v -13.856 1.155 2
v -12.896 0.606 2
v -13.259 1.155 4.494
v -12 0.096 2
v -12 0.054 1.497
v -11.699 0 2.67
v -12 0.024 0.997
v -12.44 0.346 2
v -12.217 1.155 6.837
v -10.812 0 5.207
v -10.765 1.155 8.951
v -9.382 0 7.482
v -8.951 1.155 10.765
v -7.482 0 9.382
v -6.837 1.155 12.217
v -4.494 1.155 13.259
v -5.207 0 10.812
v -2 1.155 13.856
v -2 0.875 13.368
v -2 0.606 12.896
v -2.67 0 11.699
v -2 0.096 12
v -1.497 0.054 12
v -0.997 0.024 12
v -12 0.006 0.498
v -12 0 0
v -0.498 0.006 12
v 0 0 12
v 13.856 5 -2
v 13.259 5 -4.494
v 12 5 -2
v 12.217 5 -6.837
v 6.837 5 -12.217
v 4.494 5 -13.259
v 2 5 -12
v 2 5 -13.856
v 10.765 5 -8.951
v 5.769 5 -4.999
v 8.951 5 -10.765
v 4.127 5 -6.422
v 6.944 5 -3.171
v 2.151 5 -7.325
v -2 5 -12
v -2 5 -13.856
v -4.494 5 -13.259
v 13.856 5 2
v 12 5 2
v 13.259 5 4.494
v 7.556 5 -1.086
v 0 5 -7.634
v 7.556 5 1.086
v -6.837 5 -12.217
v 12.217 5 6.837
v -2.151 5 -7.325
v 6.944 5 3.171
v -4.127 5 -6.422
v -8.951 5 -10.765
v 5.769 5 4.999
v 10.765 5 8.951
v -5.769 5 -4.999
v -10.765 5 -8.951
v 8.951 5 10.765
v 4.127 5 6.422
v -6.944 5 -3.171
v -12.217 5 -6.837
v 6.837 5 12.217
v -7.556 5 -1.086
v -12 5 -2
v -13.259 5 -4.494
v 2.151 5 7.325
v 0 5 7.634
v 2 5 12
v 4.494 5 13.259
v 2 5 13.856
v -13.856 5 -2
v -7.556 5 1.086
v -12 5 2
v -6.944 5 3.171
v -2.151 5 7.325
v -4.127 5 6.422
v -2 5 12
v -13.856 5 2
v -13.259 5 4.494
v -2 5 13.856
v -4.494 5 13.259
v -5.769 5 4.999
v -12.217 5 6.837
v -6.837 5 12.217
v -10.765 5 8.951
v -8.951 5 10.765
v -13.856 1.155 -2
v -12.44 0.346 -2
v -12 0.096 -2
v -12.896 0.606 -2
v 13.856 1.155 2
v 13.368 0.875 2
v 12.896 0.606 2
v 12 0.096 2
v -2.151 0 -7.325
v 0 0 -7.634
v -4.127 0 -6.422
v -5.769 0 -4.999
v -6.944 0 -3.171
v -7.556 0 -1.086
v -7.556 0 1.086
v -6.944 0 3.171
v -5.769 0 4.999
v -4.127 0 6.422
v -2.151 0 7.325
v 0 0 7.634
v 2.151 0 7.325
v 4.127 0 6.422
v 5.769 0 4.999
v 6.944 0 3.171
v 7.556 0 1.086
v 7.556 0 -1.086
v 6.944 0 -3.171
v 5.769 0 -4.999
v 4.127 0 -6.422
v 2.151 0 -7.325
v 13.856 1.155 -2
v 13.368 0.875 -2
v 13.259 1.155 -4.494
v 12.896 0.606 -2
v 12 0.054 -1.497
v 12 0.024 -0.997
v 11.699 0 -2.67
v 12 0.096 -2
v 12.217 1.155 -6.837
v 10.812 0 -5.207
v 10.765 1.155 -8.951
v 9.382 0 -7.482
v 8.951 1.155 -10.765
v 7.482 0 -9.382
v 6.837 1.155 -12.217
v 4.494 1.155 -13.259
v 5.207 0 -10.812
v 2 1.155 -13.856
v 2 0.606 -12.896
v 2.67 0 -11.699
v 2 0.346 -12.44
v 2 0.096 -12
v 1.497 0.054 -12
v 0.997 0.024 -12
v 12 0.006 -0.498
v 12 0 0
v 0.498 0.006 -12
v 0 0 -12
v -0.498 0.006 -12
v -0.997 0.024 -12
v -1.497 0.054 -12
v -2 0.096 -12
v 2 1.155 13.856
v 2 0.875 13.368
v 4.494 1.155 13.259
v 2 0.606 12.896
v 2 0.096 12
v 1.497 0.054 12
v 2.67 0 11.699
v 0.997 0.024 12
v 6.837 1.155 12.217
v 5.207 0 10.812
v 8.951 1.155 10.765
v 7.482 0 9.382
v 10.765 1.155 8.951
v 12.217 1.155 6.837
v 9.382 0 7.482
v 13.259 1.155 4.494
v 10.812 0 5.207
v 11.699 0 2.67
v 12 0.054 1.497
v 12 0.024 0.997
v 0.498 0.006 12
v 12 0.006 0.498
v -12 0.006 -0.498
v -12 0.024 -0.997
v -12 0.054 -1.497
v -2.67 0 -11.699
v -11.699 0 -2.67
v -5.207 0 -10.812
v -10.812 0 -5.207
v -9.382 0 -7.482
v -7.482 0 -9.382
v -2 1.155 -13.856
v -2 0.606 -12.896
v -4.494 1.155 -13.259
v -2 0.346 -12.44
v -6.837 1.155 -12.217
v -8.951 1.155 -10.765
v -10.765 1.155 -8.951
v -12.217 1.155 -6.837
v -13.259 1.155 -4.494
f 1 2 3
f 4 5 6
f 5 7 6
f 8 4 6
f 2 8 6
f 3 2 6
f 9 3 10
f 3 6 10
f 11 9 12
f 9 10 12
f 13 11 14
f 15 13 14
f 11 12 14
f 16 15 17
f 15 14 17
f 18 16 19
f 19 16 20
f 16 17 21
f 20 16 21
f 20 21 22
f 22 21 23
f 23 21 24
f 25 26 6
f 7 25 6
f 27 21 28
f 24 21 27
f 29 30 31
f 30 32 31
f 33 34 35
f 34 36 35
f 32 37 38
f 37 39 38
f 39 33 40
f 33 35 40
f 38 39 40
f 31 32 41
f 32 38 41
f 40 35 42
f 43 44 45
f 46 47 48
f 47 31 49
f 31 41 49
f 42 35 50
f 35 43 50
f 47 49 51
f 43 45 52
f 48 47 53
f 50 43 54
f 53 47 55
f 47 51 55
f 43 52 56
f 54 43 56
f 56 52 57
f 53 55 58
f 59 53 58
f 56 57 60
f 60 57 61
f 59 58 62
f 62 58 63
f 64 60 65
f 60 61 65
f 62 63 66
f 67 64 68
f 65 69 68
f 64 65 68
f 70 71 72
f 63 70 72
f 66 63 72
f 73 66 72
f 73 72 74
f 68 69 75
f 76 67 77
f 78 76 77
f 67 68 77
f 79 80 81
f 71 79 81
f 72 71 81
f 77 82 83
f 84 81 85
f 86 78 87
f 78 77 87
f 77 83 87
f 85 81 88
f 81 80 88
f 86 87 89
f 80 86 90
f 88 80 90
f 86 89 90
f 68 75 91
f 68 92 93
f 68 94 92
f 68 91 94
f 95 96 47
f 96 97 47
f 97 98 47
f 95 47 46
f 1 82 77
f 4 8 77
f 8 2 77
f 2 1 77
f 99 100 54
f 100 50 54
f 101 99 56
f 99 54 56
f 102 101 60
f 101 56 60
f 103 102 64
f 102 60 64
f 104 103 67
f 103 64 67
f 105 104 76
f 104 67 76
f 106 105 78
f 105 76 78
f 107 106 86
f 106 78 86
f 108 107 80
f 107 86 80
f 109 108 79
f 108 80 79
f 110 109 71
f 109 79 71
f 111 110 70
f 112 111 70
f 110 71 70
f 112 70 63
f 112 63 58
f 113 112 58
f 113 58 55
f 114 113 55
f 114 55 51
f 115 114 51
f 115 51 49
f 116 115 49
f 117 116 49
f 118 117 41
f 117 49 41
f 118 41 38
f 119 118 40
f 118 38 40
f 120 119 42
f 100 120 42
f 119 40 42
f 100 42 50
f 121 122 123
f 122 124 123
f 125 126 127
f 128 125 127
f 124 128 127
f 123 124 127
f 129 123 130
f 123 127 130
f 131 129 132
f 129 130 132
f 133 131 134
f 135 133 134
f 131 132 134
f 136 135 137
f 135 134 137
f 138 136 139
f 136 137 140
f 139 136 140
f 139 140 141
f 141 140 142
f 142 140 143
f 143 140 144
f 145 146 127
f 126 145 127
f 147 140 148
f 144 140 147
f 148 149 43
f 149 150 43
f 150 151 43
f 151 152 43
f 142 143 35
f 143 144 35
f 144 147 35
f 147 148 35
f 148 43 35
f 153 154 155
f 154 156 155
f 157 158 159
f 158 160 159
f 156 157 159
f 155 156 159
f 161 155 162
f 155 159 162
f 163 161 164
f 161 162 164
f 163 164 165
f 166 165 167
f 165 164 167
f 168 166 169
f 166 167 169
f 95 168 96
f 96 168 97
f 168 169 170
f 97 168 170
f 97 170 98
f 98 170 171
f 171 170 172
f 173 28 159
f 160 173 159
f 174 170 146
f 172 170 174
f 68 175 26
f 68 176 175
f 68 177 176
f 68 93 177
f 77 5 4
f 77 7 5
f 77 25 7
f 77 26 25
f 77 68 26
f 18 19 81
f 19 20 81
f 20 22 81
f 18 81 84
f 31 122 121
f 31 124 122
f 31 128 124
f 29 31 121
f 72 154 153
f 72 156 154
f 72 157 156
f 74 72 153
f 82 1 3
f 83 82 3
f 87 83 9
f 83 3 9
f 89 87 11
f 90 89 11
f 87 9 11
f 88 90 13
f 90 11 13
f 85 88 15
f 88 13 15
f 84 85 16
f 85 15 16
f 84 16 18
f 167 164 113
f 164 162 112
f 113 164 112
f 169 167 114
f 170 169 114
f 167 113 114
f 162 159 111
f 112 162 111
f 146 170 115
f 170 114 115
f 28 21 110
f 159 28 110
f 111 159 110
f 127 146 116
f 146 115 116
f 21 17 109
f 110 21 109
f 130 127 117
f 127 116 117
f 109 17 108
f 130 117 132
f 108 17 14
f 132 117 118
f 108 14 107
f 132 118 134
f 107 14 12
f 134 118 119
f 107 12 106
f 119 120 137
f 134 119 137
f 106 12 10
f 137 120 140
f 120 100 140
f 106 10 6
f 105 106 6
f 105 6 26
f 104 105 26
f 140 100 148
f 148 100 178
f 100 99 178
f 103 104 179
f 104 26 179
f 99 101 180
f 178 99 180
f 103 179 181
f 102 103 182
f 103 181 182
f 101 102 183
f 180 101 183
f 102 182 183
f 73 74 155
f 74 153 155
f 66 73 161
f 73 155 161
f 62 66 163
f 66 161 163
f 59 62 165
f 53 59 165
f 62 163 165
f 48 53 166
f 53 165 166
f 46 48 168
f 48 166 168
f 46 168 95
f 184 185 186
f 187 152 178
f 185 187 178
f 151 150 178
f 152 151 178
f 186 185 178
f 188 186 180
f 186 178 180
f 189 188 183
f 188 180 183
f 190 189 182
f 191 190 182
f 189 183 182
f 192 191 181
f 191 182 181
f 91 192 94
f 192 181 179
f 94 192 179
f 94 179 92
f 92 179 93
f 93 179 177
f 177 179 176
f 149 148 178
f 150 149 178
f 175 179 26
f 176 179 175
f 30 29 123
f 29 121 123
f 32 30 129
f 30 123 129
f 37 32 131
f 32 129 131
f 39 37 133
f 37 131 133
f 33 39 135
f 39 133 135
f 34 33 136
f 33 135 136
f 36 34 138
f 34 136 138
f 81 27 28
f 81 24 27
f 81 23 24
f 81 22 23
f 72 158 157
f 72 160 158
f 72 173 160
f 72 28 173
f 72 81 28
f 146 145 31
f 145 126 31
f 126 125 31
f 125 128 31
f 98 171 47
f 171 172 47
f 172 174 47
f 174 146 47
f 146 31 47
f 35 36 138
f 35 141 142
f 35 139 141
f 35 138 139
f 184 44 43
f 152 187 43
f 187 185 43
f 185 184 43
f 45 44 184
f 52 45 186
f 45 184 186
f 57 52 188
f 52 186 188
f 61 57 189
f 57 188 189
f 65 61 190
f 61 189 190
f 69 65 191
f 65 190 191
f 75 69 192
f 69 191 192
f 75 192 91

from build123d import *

# Parameters (mm, degrees)
ESQUISSE2_W    = 4
ESQUISSE2_H    = 2
ESQUISSE2_W_2  = 2
ESQUISSE2_H_2  = 4
ENCOCHES_DEPTH = 24.34523506


with BuildPart() as part:
    # Esquisse1 → Base (revolve)
    with BuildSketch(Plane.XY, mode=Mode.PRIVATE) as base_sk:
        Polygon((7.633974596, 5), (14, 5), (14, 1.154700538), (12, 0), (7.633974596, 0), align=None)
    revolve(base_sk.sketch.rotate(Axis((0, 0, 0), (0, 1, 0)), 90), axis=Axis((0, 0, 0), (0, 1, 0)))

    # Esquisse2 → Encoches (cut, through all)
    with BuildSketch(Plane(origin=(0, 5, -4), x_dir=(1, 0, 0), z_dir=(0, -1, 0))):
        with Locations((0, -9)):
            Rectangle(ESQUISSE2_W, ESQUISSE2_H)
        with Locations((0, 17)):
            Rectangle(ESQUISSE2_W, ESQUISSE2_H)
        with Locations((13, 4)):
            Rectangle(ESQUISSE2_W_2, ESQUISSE2_H_2)
        with Locations((-13, 4)):
            Rectangle(ESQUISSE2_W_2, ESQUISSE2_H_2)
    extrude(amount=ENCOCHES_DEPTH, mode=Mode.SUBTRACT)


solid = part.part
